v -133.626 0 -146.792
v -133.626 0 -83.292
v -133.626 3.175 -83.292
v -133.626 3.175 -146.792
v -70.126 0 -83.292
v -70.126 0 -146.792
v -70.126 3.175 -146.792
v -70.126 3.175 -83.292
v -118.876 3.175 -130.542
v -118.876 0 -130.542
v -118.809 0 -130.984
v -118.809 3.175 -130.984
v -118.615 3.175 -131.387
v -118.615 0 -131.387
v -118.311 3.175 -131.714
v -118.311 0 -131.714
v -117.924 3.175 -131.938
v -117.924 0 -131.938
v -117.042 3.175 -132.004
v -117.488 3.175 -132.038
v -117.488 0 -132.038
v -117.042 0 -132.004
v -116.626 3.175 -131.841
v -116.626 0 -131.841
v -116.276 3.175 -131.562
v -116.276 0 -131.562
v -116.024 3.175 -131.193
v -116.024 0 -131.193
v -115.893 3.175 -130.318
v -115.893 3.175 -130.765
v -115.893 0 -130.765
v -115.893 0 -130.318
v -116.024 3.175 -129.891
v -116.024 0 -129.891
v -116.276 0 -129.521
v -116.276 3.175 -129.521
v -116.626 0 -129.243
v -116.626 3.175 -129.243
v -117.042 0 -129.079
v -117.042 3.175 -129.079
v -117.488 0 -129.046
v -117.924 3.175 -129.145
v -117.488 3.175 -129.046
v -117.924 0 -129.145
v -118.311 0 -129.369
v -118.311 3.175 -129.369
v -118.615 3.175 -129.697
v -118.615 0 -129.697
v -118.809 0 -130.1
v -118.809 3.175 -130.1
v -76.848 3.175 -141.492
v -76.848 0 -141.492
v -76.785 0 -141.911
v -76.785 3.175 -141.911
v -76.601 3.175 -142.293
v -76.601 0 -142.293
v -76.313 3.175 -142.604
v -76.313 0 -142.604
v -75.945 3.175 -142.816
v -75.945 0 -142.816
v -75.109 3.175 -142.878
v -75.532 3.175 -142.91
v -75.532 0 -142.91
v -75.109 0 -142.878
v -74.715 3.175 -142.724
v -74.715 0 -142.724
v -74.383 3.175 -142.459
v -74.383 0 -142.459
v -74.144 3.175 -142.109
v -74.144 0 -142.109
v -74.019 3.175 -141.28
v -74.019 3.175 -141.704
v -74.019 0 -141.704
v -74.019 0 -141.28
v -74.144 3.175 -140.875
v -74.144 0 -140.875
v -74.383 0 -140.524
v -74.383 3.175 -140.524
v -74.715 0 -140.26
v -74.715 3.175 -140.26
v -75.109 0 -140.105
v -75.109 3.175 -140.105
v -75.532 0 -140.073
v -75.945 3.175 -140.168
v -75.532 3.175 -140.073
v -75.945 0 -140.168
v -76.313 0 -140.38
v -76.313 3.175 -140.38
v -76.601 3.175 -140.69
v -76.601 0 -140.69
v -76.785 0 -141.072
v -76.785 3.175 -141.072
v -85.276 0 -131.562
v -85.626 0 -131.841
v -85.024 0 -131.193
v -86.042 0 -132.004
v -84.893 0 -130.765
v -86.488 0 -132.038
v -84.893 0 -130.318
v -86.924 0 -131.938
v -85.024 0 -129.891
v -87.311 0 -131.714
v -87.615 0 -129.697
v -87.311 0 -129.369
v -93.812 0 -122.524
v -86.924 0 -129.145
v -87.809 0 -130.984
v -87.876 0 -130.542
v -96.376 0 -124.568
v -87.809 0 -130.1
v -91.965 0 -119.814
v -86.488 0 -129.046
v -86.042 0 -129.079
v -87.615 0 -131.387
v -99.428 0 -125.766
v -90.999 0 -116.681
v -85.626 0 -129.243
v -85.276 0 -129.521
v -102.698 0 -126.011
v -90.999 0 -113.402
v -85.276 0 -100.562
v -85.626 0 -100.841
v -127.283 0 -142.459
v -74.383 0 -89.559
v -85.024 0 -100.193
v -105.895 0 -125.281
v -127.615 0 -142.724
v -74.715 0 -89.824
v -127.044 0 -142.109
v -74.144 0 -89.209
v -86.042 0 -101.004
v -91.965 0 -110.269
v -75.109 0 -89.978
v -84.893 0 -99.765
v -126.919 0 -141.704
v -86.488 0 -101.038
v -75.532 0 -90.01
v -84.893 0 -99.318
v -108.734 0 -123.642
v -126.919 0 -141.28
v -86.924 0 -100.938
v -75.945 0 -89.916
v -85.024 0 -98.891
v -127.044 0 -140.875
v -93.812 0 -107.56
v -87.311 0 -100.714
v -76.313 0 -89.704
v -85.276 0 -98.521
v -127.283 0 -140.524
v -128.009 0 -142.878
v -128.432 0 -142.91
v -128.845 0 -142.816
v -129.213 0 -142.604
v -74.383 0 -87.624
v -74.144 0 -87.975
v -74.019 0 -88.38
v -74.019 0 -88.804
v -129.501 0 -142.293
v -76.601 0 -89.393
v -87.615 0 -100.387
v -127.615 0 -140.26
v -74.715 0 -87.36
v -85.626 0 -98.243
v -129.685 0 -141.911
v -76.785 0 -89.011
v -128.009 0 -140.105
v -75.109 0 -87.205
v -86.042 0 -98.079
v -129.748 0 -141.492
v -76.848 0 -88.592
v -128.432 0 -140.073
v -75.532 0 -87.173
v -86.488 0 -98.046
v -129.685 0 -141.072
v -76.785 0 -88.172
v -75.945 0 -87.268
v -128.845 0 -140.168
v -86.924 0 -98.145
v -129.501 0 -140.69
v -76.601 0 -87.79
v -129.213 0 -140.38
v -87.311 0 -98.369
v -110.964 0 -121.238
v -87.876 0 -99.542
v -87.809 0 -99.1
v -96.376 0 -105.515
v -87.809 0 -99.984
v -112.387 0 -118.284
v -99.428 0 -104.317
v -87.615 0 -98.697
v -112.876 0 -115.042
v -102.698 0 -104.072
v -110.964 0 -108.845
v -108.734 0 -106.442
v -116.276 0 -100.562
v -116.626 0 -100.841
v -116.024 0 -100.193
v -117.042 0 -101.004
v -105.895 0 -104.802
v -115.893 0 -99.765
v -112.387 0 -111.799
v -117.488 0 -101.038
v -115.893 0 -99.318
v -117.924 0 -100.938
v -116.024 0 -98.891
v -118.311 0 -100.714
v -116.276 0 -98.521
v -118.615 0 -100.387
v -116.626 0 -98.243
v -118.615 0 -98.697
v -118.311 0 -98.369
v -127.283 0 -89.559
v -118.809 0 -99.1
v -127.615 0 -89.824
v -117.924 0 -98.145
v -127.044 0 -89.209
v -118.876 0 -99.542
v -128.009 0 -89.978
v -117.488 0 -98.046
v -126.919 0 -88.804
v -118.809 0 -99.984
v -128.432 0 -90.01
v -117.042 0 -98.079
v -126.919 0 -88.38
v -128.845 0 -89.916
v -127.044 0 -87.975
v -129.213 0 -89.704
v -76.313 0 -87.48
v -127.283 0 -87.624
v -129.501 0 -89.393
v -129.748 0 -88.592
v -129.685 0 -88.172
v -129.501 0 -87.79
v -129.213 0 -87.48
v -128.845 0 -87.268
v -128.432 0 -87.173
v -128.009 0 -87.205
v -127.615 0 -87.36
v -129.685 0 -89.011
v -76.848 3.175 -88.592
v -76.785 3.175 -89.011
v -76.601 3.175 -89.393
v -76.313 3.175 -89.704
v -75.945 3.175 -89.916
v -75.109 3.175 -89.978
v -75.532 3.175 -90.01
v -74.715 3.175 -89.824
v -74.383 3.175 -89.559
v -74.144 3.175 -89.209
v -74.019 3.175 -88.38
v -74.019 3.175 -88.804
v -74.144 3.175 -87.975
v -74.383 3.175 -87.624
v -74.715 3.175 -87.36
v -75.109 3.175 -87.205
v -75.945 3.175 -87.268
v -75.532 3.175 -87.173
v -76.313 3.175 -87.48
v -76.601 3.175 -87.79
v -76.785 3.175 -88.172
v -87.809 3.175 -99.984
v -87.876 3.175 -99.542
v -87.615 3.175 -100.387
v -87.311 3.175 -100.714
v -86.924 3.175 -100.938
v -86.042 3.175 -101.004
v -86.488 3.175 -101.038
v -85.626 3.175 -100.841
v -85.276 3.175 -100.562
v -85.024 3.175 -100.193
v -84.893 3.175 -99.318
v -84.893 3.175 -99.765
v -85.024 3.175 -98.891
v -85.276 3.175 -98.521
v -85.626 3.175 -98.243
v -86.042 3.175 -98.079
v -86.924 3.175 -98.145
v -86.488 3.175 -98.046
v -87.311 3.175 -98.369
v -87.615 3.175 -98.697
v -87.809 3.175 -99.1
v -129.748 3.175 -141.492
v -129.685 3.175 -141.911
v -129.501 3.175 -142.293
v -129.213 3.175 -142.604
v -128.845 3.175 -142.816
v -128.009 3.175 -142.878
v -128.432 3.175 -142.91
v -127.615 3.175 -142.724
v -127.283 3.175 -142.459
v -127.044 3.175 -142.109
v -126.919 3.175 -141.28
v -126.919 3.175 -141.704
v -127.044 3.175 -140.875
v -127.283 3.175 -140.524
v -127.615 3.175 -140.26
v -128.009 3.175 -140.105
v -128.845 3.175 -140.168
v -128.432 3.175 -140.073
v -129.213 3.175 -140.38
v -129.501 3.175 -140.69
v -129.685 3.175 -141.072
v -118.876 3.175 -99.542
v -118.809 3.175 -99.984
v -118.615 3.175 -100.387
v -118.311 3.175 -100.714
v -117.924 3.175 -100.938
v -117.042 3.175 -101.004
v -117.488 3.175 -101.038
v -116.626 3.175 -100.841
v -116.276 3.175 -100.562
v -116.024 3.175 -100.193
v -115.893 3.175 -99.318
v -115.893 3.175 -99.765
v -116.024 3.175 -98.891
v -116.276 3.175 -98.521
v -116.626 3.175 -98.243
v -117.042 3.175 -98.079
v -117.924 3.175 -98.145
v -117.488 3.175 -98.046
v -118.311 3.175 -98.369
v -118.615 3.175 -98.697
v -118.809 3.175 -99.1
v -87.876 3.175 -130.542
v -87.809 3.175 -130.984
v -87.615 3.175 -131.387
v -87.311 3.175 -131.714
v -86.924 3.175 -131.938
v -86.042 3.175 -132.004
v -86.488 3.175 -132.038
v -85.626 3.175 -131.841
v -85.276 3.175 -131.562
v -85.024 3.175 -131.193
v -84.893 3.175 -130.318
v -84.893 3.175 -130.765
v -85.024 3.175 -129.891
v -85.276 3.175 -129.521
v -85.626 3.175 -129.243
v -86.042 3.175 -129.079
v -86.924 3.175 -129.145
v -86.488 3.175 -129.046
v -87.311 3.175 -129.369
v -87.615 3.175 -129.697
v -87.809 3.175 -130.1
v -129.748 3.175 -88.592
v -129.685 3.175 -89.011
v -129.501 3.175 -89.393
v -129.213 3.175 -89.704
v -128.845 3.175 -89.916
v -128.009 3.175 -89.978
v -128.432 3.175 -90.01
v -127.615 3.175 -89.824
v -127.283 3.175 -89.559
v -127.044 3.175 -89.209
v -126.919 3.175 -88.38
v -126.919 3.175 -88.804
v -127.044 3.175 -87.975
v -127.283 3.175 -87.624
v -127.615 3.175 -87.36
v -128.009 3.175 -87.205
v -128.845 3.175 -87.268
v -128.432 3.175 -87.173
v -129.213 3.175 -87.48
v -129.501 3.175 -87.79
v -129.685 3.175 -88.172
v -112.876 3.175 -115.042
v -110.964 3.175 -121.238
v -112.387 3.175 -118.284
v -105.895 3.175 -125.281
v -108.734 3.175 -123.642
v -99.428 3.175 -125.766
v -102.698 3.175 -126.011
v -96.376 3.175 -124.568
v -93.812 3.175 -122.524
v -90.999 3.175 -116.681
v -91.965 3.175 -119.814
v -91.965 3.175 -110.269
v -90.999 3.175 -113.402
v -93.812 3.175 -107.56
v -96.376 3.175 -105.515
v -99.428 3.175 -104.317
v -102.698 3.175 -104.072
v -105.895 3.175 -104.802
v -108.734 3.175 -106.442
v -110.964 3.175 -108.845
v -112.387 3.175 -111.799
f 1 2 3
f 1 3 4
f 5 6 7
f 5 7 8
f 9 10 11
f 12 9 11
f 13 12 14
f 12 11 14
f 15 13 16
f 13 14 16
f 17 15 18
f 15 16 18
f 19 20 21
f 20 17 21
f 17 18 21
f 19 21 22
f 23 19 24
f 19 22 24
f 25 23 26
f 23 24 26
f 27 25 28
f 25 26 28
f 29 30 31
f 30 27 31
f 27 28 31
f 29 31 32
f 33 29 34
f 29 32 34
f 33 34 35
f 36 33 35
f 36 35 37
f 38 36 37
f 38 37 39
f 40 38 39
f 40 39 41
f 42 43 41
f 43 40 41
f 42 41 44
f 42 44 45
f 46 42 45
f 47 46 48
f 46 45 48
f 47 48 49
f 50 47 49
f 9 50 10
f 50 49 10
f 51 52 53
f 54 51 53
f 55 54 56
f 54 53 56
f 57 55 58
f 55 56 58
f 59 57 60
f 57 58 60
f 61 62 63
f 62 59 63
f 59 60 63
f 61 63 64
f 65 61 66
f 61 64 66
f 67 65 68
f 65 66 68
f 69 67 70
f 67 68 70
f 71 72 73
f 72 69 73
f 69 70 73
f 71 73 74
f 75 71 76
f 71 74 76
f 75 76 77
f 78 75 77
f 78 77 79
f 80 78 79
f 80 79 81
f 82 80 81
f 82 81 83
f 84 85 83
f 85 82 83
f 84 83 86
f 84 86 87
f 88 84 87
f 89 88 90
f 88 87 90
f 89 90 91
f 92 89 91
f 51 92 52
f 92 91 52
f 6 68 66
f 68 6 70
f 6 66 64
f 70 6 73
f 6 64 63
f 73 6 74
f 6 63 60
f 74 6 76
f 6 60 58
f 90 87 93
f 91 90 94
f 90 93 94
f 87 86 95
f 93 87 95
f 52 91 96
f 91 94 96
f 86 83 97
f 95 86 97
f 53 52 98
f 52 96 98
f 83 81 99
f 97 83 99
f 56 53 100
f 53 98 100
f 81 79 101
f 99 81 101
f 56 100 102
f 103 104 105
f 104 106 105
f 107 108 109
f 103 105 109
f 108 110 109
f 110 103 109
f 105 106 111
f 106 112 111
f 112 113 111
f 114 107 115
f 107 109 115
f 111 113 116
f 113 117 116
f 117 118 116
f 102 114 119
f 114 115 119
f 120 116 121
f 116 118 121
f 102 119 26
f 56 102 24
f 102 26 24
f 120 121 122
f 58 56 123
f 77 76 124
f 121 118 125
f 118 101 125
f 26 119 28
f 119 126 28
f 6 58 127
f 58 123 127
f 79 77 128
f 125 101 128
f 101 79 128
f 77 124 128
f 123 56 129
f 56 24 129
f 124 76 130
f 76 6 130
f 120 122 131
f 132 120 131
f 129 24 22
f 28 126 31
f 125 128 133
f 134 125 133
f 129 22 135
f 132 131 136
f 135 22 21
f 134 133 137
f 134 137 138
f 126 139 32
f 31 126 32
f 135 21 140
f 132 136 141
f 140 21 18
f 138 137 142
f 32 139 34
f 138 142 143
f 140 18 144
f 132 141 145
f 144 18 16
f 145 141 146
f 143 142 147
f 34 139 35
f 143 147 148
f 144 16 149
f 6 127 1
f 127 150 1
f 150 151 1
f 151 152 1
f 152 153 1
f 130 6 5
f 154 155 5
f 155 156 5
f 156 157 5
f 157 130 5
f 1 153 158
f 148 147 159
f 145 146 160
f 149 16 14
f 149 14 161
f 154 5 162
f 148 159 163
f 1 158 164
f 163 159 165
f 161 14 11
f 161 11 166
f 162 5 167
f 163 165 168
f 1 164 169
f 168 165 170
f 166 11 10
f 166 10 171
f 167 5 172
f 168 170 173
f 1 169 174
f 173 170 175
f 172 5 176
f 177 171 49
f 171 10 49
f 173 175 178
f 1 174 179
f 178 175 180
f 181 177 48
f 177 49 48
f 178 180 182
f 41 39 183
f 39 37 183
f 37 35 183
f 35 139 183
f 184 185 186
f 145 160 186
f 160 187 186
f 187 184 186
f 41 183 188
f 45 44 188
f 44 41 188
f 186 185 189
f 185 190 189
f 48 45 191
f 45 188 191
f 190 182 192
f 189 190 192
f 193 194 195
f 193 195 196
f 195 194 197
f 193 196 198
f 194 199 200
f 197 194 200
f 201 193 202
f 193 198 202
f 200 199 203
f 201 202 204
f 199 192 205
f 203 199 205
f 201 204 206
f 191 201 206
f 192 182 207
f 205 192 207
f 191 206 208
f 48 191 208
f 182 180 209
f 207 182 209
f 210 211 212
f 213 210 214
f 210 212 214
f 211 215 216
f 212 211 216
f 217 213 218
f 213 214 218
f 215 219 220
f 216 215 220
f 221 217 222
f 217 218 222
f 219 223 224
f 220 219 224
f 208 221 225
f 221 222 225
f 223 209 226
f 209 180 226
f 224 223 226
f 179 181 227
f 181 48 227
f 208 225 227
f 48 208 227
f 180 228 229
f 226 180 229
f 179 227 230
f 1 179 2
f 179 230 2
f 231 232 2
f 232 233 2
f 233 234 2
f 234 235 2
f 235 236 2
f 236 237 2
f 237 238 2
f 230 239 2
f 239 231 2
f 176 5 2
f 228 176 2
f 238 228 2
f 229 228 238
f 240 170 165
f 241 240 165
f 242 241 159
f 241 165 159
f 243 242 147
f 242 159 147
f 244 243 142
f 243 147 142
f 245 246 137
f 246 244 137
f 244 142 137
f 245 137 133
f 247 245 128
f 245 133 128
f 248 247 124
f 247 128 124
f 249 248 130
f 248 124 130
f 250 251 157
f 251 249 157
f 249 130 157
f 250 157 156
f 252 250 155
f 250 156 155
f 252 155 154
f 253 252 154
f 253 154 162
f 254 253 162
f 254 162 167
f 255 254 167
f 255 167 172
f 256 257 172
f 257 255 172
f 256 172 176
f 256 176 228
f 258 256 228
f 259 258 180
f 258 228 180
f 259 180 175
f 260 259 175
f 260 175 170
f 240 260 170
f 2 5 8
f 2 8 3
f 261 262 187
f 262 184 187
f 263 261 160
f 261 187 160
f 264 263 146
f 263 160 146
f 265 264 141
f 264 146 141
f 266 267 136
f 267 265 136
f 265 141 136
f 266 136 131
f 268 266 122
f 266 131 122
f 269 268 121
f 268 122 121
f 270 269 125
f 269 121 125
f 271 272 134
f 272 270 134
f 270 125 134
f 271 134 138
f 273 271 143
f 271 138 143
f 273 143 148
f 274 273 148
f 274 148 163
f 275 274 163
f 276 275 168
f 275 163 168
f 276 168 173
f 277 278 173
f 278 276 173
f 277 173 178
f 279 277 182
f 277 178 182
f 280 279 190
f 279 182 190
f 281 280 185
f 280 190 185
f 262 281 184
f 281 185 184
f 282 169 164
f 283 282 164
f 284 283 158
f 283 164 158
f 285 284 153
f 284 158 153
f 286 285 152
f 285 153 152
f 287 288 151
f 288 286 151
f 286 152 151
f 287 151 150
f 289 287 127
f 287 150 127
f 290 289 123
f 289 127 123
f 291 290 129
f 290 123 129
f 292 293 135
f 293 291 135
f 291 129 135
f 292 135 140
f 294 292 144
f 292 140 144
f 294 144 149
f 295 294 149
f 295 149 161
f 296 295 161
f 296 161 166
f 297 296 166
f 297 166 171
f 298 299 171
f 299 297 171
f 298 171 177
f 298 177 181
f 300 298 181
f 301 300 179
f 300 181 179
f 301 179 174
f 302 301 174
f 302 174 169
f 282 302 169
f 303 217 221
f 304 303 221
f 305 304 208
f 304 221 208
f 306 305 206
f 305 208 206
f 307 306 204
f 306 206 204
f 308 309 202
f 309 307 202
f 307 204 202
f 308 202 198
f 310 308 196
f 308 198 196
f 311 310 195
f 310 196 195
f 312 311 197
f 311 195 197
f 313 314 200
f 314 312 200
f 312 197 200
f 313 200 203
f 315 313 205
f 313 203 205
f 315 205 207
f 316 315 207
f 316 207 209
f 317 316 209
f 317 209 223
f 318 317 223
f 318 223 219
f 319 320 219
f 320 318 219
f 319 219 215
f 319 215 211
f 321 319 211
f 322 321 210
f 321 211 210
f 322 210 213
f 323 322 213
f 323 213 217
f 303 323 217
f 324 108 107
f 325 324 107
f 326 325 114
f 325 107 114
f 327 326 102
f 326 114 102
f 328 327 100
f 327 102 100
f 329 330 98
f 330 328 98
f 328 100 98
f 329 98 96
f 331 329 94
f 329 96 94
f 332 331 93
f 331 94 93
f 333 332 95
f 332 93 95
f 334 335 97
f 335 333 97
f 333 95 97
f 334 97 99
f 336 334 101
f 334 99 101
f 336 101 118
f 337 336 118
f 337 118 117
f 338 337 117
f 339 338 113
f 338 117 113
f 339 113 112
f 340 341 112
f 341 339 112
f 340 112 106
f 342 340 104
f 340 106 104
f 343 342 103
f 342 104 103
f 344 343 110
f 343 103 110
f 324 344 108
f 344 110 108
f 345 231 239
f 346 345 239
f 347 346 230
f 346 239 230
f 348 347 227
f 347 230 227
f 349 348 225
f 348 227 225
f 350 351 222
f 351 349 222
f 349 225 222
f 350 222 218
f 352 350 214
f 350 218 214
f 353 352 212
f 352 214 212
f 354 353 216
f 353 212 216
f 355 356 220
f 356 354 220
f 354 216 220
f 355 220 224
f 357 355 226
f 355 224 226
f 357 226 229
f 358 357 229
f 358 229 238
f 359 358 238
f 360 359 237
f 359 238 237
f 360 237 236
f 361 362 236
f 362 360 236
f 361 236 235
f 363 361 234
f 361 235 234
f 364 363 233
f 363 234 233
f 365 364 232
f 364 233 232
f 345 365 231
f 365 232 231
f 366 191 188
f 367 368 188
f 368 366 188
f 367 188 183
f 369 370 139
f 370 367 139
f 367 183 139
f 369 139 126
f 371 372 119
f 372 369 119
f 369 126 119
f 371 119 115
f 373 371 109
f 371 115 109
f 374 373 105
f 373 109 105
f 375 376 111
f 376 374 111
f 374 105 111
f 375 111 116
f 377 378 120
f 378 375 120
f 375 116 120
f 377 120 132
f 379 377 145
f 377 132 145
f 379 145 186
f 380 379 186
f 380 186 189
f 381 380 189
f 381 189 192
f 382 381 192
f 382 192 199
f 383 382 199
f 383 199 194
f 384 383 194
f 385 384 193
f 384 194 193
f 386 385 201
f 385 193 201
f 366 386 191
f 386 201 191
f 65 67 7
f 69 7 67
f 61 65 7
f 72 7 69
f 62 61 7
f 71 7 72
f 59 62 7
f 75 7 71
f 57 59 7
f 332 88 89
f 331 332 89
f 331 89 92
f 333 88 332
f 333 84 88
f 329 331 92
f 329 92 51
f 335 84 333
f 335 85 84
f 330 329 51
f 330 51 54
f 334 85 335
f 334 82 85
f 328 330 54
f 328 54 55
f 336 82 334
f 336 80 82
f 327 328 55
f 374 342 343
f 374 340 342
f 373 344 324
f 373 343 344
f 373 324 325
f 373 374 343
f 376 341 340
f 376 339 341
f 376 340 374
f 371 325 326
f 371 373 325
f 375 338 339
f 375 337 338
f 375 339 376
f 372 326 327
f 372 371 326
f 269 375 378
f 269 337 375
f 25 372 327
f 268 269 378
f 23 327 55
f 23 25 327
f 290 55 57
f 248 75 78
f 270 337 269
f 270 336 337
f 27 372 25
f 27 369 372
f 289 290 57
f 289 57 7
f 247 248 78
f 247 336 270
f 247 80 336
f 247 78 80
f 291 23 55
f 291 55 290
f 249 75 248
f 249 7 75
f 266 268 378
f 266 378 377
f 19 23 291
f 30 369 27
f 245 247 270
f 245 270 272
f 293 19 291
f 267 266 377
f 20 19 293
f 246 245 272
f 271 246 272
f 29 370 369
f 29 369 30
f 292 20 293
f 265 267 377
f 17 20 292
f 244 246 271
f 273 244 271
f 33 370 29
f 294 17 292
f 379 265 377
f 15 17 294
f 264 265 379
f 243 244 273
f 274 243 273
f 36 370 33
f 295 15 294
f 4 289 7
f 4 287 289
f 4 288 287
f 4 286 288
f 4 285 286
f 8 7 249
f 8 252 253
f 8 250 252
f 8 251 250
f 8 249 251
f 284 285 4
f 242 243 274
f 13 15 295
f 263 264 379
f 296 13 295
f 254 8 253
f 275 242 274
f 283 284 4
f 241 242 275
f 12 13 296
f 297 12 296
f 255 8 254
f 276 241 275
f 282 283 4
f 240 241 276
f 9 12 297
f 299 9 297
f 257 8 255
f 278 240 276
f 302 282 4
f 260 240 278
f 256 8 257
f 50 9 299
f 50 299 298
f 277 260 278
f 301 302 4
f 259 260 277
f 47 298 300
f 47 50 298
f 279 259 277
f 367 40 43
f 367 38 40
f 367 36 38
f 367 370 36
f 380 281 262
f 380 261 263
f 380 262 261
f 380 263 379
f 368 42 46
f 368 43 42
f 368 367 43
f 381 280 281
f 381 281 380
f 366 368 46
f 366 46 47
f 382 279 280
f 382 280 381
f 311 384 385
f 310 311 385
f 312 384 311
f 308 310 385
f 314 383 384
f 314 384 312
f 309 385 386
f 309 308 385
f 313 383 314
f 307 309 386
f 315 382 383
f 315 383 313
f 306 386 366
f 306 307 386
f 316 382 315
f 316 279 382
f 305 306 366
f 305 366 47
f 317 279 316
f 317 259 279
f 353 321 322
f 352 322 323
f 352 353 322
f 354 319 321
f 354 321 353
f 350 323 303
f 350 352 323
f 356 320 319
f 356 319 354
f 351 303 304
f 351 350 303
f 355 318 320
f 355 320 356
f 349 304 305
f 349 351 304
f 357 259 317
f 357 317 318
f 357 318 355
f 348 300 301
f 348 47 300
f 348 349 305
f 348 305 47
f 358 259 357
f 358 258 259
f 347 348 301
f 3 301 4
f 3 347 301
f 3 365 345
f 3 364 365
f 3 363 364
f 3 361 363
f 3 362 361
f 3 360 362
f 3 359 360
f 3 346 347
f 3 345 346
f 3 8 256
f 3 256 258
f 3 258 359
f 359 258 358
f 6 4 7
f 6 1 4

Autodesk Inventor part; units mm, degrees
ref_plane "YZ Plane" through (0, 0, 0) normal (1, 0, 0) x (0, 1, 0)
ref_plane "XZ Plane" through (0, 0, 0) normal (0, 1, 0) x (-1, 0, 0)
ref_plane "XY Plane" through (0, 0, 0) normal (0, 0, 1) x (1, 0, 0)
sketch "Sketch1" plane through (0, 0, 0) normal (0, 1, 0) x (-1, 0, 0)
  circle A0 centre (86.3758, -99.5417) radius 1.5 projected
  circle A1 centre (117.3758, -99.5417) radius 1.5 projected
  circle A2 centre (117.3758, -130.5417) radius 1.5 projected
  circle A3 centre (86.3758, -130.5417) radius 1.5 projected
  circle A4 centre (101.8758, -115.0417) radius 11 projected
  line L0 (133.6258, -146.7917) -> (70.1258, -146.7917)
  line L1 (70.1258, -146.7917) -> (70.1258, -83.2917)
  line L2 (70.1258, -83.2917) -> (133.6258, -83.2917)
  line L3 (133.6258, -83.2917) -> (133.6258, -146.7917)
  line L4 (80.7258, -93.8917) -> (123.0258, -93.8917) construction
  line L5 (123.0258, -93.8917) -> (123.0258, -136.1917) construction
  line L6 (123.0258, -136.1917) -> (80.7258, -136.1917) construction
  line L7 (80.7258, -136.1917) -> (80.7258, -93.8917) construction
  line L8 (80.7258, -136.1917) -> (123.0258, -93.8917) construction
  line L9 (123.0258, -136.1917) -> (80.7258, -93.8917) construction
  circle A5 centre (75.4258, -88.5917) radius 1.4224
  circle A6 centre (75.4258, -141.4917) radius 1.4224
  circle A7 centre (128.3258, -141.4917) radius 1.4224
  circle A8 centre (128.3258, -88.5917) radius 1.4224
  point P0 (0, 0)
  dimension "d9" = 63.5
  dimension "d11" = 2.8448
  dimension "d12" = 2.8448
  dimension "d19" = 63.5
  dimension "d20" = 2.8448
  dimension "d21" = 2.8448
extrude "Extrusion1" add sketch "Sketch1" along normal blind 3.175
ref_plane "Work Plane1" through (-70.1258, 0, -115.0417) normal (0, 0, -1) x (-1, 0, 0)
